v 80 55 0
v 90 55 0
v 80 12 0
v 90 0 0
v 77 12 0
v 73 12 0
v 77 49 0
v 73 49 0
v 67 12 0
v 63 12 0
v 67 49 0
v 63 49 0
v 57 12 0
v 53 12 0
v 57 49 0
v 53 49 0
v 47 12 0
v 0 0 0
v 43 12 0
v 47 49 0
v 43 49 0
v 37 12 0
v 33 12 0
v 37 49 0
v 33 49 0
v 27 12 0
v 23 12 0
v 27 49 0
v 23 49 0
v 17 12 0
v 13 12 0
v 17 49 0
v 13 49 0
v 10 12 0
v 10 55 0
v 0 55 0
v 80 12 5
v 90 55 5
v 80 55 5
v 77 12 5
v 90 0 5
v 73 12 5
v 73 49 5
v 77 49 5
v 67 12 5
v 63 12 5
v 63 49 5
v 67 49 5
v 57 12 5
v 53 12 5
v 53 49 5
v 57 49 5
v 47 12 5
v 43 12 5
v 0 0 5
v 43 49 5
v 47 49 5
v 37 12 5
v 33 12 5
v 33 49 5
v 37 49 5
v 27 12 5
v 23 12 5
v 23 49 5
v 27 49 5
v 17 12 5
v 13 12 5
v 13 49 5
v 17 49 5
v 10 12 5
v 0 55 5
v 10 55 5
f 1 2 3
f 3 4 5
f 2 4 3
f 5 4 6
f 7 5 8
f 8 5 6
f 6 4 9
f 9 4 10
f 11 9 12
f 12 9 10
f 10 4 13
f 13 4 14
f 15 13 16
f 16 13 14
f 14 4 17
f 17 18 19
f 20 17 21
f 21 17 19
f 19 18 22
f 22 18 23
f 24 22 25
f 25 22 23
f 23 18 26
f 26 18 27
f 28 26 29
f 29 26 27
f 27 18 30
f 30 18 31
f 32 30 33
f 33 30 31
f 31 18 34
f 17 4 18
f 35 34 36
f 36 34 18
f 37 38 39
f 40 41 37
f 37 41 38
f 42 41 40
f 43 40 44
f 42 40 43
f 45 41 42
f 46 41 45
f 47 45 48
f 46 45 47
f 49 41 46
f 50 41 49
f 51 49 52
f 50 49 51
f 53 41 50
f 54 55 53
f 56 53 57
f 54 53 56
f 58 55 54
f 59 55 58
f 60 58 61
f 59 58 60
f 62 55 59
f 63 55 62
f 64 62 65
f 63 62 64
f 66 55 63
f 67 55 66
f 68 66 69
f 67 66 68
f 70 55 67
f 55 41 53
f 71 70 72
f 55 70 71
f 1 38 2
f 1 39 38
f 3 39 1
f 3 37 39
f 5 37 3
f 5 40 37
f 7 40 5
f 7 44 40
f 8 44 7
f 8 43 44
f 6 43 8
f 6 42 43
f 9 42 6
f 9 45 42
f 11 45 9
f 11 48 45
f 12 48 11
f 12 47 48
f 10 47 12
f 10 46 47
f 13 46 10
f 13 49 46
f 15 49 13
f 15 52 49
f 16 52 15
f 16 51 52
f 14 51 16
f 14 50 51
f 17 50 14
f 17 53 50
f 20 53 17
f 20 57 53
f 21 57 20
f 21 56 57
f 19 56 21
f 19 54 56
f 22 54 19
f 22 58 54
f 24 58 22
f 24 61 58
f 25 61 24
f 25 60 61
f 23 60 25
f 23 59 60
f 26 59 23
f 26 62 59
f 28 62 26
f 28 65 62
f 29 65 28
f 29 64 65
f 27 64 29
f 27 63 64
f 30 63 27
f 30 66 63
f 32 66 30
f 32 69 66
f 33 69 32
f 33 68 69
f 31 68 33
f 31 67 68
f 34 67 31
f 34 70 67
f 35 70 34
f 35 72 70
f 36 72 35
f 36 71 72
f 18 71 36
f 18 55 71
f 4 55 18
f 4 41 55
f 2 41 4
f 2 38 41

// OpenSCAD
$fn = 32;

// ----------------------------------------------------------------------
// Guard grille: 7 slats over a 90 x 55 mm plate
// ----------------------------------------------------------------------

// --- parameters (mm) ---
profile_height = 5;       // extrusion height
profile_points = 36;      // points of the closed outline

profile = [[0, 0], [90, 0], [90, 55], [80, 55], [80, 12], [77, 12], [77, 49], [73, 49], [73, 12], [67, 12], [67, 49], [63, 49], [63, 12], [57, 12], [57, 49], [53, 49], [53, 12], [47, 12], [47, 49], [43, 49], [43, 12], [37, 12], [37, 49], [33, 49], [33, 12], [27, 12], [27, 49], [23, 49], [23, 12], [17, 12], [17, 49], [13, 49], [13, 12], [10, 12], [10, 55], [0, 55]];  // single closed polygon, 36 points, counter clockwise

// --- the one profile operation ---
linear_extrude(height = profile_height) polygon(points = profile);
